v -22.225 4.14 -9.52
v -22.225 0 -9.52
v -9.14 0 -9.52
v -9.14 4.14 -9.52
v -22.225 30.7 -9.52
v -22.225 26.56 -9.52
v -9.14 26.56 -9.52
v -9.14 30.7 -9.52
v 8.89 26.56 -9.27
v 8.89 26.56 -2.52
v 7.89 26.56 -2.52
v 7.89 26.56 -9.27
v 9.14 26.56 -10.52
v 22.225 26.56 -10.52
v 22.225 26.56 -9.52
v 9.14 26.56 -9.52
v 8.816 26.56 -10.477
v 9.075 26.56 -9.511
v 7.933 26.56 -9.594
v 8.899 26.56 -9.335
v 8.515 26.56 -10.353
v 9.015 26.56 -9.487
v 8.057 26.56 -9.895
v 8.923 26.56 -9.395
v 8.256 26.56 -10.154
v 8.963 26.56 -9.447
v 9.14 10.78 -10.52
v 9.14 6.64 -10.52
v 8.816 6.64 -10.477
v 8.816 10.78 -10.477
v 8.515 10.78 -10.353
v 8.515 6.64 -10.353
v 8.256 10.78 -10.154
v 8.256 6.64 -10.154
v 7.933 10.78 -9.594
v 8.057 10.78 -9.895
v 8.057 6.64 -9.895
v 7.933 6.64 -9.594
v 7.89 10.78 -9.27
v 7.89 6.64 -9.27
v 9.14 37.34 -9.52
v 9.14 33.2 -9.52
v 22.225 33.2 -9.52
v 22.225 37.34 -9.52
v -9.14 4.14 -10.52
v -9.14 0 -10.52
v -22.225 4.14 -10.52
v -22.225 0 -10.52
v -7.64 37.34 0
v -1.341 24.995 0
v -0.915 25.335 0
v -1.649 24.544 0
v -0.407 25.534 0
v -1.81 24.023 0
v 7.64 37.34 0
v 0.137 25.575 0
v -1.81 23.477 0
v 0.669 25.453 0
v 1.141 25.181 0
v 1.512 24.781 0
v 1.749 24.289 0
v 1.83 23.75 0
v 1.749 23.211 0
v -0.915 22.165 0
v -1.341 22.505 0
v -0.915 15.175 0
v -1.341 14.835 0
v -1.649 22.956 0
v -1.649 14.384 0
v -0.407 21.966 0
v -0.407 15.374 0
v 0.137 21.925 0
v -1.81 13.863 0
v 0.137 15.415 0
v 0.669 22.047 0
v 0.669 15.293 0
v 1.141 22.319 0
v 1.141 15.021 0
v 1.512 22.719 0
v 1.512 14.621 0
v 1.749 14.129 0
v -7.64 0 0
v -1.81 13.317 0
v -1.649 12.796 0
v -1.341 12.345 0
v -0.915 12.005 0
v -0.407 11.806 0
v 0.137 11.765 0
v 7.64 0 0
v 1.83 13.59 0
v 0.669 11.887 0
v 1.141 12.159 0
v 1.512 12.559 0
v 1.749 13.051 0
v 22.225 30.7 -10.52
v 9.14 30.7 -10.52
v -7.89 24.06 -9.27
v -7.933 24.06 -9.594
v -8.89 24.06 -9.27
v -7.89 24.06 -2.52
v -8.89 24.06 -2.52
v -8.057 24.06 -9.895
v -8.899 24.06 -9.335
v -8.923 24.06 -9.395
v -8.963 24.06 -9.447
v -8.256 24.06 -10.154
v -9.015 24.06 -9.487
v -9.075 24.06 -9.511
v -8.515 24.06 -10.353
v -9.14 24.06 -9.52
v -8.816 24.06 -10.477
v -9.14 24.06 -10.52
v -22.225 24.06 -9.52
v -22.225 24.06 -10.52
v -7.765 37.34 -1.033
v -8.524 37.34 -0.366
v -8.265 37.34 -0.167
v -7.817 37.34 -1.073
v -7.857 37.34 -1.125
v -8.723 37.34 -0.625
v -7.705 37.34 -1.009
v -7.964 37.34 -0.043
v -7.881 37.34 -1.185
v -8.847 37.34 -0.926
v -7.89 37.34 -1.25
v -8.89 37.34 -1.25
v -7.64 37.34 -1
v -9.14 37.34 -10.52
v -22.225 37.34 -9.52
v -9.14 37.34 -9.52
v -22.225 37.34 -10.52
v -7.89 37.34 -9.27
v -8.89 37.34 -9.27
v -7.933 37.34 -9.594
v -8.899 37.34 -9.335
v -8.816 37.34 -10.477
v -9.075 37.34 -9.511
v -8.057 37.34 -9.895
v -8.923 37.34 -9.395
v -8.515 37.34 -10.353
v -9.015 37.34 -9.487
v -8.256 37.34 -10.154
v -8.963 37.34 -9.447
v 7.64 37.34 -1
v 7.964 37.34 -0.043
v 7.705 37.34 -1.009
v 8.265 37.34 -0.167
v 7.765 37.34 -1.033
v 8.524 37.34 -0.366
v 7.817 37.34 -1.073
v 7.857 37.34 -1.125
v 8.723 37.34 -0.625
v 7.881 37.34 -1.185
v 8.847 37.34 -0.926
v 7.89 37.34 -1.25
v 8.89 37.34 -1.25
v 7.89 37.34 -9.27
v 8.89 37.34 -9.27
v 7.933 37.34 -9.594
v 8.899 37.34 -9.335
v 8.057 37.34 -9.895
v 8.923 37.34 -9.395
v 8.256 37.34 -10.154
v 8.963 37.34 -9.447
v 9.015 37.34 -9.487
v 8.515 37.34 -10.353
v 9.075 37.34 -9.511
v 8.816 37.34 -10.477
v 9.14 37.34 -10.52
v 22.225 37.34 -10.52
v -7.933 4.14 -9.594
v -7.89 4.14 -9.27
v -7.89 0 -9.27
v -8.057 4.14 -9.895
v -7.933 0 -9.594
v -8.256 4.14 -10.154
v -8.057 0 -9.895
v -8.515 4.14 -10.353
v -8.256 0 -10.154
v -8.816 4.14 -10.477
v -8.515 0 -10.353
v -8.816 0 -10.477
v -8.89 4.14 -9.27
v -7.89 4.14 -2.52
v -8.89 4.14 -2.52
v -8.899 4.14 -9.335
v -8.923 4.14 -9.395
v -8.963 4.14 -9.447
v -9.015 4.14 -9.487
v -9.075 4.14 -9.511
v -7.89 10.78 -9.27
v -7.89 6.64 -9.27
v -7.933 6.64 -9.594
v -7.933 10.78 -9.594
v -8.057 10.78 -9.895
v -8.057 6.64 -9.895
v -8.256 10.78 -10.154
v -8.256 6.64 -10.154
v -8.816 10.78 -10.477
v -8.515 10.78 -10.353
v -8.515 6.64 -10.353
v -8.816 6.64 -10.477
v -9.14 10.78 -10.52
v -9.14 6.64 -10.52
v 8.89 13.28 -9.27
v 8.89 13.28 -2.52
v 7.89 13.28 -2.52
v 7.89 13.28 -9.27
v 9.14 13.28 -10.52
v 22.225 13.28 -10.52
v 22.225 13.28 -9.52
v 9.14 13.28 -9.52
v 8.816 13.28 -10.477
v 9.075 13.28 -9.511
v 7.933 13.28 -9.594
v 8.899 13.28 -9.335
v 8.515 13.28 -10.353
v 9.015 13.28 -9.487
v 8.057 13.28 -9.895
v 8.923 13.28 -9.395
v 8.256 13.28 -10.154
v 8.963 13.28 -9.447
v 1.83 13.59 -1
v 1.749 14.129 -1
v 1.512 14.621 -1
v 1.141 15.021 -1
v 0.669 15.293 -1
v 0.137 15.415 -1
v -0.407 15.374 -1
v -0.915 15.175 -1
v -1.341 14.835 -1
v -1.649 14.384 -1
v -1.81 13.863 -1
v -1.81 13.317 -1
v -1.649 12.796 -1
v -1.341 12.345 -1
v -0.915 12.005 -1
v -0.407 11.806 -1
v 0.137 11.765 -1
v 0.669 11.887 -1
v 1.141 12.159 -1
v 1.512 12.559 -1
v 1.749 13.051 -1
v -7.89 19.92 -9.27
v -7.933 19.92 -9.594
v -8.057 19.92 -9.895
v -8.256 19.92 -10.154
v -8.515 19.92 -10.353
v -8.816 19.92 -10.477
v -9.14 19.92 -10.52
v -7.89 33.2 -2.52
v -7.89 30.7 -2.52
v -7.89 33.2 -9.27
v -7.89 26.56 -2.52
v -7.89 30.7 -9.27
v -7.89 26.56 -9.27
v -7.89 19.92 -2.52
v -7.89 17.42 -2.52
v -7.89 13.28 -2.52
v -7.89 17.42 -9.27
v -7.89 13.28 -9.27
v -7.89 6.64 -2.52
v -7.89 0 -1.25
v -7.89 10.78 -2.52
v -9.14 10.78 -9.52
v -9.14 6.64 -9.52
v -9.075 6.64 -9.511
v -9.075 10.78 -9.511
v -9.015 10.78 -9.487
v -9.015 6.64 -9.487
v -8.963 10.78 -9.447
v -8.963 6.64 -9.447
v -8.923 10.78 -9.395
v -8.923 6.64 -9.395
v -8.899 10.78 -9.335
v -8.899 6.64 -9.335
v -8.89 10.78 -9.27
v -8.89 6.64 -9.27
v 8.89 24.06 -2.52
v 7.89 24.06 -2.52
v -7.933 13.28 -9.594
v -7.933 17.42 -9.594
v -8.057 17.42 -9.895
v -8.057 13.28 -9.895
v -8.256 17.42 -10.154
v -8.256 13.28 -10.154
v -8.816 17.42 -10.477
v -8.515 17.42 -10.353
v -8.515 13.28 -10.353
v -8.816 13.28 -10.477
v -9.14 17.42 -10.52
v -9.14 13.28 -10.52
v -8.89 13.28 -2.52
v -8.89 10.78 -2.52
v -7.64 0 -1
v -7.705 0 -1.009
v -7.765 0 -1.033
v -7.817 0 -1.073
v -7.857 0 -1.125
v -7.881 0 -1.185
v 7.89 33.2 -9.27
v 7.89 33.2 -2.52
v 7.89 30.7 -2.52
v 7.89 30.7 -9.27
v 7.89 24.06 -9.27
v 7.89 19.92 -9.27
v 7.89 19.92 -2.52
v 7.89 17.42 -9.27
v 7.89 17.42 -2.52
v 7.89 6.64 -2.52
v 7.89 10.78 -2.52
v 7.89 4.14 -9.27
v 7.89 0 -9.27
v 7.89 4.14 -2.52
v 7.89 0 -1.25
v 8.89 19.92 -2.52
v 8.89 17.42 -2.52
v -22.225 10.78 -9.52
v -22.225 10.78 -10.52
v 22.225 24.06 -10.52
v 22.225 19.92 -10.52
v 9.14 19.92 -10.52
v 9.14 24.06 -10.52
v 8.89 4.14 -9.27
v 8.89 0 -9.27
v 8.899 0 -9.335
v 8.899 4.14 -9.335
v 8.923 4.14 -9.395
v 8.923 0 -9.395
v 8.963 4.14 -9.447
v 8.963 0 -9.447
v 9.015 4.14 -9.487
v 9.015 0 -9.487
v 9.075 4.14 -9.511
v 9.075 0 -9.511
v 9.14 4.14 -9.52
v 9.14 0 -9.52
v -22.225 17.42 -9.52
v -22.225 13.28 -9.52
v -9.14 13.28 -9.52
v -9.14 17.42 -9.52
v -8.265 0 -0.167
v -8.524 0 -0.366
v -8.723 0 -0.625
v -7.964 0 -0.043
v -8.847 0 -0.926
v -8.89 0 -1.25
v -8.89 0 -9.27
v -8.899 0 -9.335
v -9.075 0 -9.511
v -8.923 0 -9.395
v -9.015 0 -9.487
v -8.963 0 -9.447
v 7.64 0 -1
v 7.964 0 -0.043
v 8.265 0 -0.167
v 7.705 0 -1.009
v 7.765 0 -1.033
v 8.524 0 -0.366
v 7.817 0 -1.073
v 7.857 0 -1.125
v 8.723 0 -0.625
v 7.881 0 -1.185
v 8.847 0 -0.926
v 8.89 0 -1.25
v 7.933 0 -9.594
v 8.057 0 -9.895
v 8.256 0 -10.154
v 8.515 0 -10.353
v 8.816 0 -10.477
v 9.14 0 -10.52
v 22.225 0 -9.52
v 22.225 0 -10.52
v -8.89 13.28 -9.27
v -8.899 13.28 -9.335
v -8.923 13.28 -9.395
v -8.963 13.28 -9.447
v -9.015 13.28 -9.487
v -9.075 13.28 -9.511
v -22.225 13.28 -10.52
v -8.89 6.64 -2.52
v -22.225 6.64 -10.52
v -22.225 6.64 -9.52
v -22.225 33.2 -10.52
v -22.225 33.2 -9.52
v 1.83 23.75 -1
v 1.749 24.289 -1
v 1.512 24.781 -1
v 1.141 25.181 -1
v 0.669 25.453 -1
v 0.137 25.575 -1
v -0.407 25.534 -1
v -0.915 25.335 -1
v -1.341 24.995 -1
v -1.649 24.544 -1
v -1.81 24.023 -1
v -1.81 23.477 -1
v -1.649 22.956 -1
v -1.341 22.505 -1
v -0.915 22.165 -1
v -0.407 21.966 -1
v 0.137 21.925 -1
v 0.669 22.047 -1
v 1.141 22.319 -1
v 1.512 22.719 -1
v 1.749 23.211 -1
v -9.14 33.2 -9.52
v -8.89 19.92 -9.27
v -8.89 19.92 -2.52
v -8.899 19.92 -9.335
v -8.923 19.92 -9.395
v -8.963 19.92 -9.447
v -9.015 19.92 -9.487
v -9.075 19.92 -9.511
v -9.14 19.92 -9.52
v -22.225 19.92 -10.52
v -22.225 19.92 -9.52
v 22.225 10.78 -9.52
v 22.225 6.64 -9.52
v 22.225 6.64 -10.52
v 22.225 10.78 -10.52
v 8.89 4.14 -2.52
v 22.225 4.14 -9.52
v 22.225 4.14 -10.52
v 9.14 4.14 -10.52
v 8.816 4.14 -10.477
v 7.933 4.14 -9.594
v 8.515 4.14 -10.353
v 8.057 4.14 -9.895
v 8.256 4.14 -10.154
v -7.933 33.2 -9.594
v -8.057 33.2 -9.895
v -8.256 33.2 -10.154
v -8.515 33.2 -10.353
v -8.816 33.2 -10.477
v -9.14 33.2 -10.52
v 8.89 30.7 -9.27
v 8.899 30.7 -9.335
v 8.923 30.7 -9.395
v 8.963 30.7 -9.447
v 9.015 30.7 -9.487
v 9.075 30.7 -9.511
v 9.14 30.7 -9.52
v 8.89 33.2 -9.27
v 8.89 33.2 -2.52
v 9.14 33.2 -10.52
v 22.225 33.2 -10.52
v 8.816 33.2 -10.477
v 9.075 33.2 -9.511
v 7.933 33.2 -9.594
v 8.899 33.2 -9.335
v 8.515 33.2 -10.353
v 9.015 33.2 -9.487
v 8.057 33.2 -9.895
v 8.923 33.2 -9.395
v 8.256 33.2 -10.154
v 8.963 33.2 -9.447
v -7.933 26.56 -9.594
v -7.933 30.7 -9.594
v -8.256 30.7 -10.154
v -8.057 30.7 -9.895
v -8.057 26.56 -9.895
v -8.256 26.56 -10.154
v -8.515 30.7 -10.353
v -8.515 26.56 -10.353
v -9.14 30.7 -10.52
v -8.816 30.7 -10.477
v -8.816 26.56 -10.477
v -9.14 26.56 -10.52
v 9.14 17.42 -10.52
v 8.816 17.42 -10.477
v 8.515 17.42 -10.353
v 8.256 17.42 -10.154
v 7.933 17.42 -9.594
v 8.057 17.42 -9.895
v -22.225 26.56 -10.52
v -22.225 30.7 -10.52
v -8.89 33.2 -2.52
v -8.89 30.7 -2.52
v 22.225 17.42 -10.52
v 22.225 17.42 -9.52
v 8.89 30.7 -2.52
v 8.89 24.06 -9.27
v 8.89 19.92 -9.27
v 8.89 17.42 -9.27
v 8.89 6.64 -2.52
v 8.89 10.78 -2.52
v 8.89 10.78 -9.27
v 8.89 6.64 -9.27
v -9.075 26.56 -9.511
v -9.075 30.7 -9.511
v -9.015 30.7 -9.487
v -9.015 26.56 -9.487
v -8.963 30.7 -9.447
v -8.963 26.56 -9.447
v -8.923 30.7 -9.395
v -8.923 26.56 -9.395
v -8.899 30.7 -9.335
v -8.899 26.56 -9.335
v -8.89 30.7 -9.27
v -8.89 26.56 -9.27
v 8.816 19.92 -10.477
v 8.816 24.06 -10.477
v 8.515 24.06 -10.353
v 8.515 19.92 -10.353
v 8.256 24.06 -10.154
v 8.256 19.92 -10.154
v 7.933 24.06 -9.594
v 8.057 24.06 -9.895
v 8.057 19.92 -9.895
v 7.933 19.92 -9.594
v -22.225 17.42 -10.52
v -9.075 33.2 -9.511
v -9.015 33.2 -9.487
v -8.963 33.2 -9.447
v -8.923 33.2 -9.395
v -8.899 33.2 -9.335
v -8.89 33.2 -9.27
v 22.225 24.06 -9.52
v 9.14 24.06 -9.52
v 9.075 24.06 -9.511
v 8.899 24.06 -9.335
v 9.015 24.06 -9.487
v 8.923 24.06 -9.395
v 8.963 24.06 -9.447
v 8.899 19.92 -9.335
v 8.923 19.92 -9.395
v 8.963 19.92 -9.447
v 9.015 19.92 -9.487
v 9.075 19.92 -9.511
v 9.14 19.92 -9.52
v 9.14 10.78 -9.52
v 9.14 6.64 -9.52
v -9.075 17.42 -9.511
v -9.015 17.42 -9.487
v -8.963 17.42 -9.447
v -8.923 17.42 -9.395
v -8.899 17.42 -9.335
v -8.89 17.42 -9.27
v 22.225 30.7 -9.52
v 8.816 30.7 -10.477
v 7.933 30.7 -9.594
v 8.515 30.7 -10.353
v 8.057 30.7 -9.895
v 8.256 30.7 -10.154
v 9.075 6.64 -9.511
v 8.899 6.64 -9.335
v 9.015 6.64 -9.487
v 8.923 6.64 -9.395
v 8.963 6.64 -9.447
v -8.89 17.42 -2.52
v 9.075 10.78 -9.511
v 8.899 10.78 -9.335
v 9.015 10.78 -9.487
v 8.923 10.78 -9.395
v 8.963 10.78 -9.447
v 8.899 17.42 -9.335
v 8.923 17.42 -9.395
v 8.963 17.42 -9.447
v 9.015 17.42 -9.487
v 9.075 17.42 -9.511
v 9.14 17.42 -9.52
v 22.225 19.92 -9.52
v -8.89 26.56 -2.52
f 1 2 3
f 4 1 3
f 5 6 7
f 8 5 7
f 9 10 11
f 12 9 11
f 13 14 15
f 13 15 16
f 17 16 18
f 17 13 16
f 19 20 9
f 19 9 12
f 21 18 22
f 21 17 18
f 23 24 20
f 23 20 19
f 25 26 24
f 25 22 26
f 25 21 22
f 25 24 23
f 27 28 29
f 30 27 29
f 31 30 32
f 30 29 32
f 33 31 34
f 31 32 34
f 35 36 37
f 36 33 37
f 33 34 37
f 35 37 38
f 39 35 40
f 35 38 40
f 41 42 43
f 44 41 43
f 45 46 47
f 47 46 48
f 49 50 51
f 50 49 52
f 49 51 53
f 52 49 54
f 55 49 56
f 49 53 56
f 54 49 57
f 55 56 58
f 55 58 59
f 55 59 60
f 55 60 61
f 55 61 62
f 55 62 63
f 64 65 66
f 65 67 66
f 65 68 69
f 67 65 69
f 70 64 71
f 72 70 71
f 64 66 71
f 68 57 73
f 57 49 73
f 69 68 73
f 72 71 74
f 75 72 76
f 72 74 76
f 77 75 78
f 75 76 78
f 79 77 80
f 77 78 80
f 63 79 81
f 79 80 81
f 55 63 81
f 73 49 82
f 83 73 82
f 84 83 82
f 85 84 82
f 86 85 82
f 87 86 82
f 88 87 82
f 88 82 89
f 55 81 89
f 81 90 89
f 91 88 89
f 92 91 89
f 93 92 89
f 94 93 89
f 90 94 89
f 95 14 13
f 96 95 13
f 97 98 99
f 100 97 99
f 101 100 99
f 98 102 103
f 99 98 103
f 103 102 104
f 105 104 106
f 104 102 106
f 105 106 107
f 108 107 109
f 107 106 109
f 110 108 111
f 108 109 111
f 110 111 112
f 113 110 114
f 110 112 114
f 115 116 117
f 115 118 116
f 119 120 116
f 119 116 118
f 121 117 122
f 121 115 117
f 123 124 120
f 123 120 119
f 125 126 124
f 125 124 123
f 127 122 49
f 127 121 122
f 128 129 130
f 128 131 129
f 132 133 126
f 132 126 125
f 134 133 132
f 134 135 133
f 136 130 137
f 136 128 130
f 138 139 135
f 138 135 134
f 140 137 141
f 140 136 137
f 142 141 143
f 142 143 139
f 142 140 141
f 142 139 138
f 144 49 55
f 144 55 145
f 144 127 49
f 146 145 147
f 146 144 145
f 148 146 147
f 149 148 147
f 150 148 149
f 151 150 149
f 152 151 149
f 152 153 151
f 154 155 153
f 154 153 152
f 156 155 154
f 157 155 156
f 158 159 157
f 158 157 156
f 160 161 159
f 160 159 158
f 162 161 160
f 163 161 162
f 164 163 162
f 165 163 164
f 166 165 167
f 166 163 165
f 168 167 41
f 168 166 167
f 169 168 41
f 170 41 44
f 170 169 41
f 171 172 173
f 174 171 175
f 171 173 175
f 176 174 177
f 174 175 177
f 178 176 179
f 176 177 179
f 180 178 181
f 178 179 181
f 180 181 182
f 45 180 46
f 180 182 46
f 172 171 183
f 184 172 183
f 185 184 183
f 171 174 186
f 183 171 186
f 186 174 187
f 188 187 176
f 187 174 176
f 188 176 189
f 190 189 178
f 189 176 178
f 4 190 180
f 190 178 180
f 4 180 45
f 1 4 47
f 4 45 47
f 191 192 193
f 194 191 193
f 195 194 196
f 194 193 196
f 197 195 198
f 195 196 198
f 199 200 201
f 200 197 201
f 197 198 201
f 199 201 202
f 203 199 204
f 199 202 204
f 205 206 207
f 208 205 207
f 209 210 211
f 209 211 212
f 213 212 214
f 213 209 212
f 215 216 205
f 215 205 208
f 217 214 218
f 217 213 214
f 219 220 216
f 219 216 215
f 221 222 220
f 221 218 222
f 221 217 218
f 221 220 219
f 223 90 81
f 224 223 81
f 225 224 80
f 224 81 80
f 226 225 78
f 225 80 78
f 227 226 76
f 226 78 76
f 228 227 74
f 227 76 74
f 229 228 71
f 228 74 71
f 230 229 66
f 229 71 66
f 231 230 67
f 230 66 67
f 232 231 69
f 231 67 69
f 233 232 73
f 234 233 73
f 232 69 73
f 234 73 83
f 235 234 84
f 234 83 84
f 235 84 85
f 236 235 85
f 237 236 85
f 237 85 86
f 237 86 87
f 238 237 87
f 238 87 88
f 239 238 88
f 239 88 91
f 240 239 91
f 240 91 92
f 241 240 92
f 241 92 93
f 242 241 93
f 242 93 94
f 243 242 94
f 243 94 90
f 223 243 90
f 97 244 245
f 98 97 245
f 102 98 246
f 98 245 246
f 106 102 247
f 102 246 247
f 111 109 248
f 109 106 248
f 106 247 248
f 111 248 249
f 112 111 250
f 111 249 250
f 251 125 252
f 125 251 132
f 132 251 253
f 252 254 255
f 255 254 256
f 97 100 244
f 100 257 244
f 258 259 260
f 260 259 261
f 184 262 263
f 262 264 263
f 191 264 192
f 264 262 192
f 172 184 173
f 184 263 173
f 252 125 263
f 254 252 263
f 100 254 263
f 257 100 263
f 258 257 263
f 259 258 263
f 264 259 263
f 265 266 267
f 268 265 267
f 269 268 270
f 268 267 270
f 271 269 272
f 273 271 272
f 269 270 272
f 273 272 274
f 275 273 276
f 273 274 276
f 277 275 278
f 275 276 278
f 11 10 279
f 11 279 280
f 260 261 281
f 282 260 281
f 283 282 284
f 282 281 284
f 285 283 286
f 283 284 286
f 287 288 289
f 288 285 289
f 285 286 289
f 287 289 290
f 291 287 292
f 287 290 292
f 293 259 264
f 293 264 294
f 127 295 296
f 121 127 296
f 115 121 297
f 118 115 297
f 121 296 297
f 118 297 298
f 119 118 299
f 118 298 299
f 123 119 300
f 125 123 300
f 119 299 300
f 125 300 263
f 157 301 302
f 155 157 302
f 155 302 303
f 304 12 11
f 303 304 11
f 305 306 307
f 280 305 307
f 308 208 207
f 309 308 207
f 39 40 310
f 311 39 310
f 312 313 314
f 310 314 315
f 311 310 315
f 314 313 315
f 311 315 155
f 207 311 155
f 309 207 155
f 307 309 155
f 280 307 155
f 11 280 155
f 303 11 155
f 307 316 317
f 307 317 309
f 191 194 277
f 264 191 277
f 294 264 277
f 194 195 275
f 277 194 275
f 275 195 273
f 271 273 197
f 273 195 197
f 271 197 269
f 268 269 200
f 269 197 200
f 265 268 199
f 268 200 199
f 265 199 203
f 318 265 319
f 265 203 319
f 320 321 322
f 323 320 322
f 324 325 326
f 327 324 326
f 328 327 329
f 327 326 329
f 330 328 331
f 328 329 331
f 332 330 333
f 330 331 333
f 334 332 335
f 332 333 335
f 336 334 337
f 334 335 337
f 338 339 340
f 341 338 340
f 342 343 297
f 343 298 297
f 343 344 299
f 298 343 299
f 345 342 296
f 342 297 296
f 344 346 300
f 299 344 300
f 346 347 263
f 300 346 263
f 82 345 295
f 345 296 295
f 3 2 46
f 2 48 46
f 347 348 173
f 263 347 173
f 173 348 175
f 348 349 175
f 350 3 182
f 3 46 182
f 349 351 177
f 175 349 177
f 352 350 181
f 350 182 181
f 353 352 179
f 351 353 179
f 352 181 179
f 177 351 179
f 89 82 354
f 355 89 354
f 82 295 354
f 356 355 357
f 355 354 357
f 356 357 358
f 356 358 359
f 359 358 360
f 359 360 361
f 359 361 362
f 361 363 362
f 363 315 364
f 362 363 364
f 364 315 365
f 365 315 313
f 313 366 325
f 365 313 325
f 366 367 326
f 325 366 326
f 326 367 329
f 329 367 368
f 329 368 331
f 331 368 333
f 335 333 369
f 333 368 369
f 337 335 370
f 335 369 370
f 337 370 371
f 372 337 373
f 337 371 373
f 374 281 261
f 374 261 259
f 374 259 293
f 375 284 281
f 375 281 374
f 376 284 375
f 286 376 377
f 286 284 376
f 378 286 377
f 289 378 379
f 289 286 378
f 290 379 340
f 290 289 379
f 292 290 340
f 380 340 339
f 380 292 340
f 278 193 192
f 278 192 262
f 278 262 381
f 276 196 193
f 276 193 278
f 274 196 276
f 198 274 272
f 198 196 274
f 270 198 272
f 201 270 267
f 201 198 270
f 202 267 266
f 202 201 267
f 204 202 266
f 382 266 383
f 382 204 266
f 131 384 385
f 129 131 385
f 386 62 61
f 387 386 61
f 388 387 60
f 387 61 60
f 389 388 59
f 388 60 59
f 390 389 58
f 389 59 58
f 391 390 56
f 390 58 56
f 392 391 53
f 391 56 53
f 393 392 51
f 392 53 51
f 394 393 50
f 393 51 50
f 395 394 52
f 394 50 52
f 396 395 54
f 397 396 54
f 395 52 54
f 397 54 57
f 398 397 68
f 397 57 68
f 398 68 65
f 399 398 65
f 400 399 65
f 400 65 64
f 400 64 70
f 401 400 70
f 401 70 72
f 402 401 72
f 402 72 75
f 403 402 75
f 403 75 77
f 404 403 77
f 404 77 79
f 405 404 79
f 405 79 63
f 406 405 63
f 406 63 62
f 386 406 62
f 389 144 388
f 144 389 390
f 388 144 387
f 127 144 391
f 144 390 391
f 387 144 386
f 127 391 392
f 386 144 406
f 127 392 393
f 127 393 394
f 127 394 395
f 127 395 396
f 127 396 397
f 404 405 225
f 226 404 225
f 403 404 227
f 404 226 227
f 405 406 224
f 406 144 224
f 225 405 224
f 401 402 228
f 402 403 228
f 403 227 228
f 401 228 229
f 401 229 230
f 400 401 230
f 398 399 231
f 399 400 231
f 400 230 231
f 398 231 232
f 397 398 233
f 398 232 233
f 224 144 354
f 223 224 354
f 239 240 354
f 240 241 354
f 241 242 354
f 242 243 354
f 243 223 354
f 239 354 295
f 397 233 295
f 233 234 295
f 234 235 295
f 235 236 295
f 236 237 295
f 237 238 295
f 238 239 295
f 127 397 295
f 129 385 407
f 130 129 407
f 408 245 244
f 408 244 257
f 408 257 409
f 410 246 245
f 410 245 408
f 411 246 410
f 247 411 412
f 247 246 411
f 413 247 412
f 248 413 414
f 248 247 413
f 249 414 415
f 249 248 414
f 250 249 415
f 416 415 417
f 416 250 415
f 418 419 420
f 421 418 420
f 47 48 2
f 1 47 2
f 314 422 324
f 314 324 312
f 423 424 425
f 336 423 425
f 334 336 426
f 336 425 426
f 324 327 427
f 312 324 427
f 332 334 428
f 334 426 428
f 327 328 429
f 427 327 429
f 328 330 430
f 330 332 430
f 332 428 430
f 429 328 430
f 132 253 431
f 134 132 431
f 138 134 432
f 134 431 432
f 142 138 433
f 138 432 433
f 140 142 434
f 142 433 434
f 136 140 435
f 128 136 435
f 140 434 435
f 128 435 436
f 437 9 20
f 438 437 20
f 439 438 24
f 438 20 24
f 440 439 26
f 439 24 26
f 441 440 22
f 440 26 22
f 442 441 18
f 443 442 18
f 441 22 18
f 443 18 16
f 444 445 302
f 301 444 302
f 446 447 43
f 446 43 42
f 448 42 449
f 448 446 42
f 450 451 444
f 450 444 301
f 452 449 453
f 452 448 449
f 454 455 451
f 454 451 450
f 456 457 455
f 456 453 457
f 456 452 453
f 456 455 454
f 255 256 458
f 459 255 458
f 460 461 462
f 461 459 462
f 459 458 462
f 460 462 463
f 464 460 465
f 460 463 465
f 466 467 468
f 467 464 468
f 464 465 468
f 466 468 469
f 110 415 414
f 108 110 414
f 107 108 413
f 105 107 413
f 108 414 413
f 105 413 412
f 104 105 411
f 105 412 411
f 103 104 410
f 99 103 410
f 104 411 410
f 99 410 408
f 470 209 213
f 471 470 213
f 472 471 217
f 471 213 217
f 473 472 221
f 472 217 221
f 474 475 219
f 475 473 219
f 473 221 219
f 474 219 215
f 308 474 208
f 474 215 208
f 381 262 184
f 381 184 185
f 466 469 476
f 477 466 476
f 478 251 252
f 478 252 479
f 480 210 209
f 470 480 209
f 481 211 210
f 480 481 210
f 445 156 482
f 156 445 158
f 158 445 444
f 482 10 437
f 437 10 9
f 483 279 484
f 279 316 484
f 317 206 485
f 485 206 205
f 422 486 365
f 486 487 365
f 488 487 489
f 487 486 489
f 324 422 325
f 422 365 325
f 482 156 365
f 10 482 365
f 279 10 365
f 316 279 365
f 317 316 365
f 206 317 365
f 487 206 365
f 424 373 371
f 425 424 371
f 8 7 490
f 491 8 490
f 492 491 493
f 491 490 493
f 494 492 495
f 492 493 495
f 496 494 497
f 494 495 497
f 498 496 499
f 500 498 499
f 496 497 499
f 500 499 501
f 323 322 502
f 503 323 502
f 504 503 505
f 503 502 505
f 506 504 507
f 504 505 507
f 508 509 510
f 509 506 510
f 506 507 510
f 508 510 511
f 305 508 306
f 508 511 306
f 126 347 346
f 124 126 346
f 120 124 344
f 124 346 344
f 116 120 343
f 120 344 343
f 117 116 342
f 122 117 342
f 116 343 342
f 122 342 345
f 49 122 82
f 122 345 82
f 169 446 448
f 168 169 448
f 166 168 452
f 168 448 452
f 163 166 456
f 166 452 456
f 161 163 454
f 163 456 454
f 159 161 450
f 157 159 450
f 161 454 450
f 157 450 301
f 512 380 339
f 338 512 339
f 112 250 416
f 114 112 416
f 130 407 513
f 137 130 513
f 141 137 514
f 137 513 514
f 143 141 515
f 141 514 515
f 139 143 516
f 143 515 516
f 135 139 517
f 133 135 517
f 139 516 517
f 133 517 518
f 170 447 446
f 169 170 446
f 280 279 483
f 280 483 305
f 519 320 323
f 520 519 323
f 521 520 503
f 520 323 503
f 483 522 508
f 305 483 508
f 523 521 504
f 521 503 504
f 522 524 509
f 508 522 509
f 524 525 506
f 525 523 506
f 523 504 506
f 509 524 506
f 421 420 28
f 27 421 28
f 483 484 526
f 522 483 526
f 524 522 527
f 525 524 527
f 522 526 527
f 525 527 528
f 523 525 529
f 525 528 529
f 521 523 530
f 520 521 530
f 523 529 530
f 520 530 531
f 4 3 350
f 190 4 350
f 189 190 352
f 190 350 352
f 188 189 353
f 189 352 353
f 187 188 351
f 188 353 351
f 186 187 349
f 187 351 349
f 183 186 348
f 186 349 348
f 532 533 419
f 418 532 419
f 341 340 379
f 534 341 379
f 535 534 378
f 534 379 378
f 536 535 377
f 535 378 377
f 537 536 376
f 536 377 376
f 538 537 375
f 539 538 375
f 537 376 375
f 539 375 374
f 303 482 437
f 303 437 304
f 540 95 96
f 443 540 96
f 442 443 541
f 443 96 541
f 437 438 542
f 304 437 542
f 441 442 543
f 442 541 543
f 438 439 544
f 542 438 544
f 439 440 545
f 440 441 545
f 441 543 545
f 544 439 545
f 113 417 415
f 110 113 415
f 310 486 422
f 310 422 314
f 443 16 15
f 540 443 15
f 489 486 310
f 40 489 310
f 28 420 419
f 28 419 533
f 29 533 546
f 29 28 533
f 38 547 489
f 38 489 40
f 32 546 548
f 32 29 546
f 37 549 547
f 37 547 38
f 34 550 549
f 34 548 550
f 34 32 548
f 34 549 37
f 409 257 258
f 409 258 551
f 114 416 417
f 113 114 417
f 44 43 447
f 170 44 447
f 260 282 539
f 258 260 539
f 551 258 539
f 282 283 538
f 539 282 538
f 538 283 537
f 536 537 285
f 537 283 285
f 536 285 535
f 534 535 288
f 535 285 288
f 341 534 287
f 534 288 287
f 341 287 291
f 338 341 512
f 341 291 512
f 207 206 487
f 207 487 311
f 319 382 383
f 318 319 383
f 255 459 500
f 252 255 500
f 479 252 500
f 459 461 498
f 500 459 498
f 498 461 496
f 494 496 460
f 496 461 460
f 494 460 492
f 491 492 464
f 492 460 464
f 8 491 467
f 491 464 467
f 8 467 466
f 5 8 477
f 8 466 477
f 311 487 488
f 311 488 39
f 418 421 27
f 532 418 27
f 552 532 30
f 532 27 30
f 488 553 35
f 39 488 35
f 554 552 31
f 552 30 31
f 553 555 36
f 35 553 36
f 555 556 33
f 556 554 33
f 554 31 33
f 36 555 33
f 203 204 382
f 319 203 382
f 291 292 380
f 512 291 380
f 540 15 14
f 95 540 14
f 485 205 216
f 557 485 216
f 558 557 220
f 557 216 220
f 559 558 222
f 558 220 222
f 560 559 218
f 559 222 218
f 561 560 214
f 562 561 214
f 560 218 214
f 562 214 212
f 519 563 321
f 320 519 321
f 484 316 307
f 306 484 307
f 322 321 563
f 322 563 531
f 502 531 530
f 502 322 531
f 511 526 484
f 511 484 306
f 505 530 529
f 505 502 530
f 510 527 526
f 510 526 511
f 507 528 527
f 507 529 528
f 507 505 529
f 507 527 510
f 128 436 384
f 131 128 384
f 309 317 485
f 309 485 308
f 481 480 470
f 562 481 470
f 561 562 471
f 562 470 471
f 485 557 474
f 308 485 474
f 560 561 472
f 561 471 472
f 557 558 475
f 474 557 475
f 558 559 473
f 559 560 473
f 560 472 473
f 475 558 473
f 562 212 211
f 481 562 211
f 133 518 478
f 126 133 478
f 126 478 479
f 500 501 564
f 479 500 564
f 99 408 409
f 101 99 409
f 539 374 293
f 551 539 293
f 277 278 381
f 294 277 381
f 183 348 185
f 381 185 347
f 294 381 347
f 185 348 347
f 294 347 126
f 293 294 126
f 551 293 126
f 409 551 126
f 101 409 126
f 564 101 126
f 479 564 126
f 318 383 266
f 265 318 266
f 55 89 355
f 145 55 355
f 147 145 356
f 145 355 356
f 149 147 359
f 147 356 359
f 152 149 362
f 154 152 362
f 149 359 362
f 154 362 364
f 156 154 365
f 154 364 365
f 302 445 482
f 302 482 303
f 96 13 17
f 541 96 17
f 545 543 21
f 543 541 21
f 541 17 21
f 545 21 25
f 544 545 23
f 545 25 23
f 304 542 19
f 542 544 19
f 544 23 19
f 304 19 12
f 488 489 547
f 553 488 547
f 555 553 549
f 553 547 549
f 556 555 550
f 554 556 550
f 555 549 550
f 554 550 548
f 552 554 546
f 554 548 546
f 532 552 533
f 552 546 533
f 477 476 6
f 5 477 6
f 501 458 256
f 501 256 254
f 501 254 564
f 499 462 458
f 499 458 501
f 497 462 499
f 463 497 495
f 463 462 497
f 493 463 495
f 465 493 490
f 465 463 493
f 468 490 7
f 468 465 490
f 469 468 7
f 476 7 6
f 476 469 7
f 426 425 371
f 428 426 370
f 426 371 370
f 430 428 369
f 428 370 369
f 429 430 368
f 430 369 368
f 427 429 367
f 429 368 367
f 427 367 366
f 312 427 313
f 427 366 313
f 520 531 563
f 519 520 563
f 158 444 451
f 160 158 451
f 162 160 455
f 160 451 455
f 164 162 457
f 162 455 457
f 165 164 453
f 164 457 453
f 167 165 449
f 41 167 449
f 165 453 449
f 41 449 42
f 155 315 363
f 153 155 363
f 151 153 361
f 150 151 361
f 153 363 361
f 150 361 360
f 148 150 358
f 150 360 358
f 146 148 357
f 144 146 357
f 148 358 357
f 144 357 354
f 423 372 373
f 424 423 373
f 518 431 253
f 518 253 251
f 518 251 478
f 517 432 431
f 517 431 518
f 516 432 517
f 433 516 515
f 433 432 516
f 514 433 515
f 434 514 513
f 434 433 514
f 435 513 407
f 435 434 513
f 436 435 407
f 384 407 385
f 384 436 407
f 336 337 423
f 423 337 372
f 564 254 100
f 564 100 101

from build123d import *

# Parameters (mm, degrees)
EXTRUDE_THIN1_DEPTH = 37.34
SKETCH2_R           = 1.83
CUT_EXTRUDE1_DEPTH  = 11.52
SKETCH3_W           = 44.45
SKETCH3_H           = 2.5
CUT_EXTRUDE2_DEPTH  = 8


with BuildPart() as part:
    # Sketch1 → Extrude-Thin1 (new body)
    with BuildSketch(Plane(origin=(0, 0, 0), x_dir=(1, 0, 0), z_dir=(0, 1, 0))):
        with BuildLine():
            Line((-22.225, 9.52), (-9.14, 9.52))
            ThreePointArc((-9.14, 9.52), (-8.963223305, 9.446776695), (-8.89, 9.27))
            Line((-8.89, 9.27), (-8.89, 1.25))
            ThreePointArc((-8.89, 1.25), (-8.523883476, 0.366116524), (-7.64, 0))
            Line((-7.64, 0), (7.64, 0))
            ThreePointArc((7.64, 0), (8.523883476, 0.366116524), (8.89, 1.25))
            Line((8.89, 1.25), (8.89, 9.27))
            ThreePointArc((8.89, 9.27), (8.963223305, 9.446776695), (9.14, 9.52))
            Line((9.14, 9.52), (22.225, 9.52))
            Line((22.225, 9.52), (22.225, 10.52))
            Line((22.225, 10.52), (9.14, 10.52))
            ThreePointArc((9.14, 10.52), (8.256116524, 10.153883476), (7.89, 9.27))
            Line((7.89, 9.27), (7.89, 1.25))
            ThreePointArc((7.89, 1.25), (7.816776695, 1.073223305), (7.64, 1))
            Line((7.64, 1), (-7.64, 1))
            ThreePointArc((-7.64, 1), (-7.816776695, 1.073223305), (-7.89, 1.25))
            Line((-7.89, 1.25), (-7.89, 9.27))
            ThreePointArc((-7.89, 9.27), (-8.256116524, 10.153883476), (-9.14, 10.52))
            Line((-9.14, 10.52), (-22.225, 10.52))
            Line((-22.225, 10.52), (-22.225, 9.52))
        make_face()
    extrude(amount=EXTRUDE_THIN1_DEPTH)

    # Sketch2 → Cut-Extrude1 (cut, through all)
    with BuildSketch(Plane.XY):
        with Locations((0, 13.59)):
            Circle(SKETCH2_R)
        with Locations((0, 23.75)):
            Circle(SKETCH2_R)
    extrude(amount=-CUT_EXTRUDE1_DEPTH, mode=Mode.SUBTRACT)

    # Sketch3 → Cut-Extrude2 (cut)
    with BuildSketch(Plane(origin=(0, 0, -10.52), x_dir=(-1, 0, 0), z_dir=(0, 0, -1))):
        with Locations((0, 31.95)):
            Rectangle(SKETCH3_W, SKETCH3_H)
        with Locations((0, 25.31)):
            Rectangle(SKETCH3_W, SKETCH3_H)
        with Locations((0, 18.67)):
            Rectangle(SKETCH3_W, SKETCH3_H)
        with Locations((0, 12.03)):
            Rectangle(SKETCH3_W, SKETCH3_H)
        with Locations((0, 5.39)):
            Rectangle(SKETCH3_W, SKETCH3_H)
    extrude(amount=-CUT_EXTRUDE2_DEPTH, mode=Mode.SUBTRACT)


solid = part.part
